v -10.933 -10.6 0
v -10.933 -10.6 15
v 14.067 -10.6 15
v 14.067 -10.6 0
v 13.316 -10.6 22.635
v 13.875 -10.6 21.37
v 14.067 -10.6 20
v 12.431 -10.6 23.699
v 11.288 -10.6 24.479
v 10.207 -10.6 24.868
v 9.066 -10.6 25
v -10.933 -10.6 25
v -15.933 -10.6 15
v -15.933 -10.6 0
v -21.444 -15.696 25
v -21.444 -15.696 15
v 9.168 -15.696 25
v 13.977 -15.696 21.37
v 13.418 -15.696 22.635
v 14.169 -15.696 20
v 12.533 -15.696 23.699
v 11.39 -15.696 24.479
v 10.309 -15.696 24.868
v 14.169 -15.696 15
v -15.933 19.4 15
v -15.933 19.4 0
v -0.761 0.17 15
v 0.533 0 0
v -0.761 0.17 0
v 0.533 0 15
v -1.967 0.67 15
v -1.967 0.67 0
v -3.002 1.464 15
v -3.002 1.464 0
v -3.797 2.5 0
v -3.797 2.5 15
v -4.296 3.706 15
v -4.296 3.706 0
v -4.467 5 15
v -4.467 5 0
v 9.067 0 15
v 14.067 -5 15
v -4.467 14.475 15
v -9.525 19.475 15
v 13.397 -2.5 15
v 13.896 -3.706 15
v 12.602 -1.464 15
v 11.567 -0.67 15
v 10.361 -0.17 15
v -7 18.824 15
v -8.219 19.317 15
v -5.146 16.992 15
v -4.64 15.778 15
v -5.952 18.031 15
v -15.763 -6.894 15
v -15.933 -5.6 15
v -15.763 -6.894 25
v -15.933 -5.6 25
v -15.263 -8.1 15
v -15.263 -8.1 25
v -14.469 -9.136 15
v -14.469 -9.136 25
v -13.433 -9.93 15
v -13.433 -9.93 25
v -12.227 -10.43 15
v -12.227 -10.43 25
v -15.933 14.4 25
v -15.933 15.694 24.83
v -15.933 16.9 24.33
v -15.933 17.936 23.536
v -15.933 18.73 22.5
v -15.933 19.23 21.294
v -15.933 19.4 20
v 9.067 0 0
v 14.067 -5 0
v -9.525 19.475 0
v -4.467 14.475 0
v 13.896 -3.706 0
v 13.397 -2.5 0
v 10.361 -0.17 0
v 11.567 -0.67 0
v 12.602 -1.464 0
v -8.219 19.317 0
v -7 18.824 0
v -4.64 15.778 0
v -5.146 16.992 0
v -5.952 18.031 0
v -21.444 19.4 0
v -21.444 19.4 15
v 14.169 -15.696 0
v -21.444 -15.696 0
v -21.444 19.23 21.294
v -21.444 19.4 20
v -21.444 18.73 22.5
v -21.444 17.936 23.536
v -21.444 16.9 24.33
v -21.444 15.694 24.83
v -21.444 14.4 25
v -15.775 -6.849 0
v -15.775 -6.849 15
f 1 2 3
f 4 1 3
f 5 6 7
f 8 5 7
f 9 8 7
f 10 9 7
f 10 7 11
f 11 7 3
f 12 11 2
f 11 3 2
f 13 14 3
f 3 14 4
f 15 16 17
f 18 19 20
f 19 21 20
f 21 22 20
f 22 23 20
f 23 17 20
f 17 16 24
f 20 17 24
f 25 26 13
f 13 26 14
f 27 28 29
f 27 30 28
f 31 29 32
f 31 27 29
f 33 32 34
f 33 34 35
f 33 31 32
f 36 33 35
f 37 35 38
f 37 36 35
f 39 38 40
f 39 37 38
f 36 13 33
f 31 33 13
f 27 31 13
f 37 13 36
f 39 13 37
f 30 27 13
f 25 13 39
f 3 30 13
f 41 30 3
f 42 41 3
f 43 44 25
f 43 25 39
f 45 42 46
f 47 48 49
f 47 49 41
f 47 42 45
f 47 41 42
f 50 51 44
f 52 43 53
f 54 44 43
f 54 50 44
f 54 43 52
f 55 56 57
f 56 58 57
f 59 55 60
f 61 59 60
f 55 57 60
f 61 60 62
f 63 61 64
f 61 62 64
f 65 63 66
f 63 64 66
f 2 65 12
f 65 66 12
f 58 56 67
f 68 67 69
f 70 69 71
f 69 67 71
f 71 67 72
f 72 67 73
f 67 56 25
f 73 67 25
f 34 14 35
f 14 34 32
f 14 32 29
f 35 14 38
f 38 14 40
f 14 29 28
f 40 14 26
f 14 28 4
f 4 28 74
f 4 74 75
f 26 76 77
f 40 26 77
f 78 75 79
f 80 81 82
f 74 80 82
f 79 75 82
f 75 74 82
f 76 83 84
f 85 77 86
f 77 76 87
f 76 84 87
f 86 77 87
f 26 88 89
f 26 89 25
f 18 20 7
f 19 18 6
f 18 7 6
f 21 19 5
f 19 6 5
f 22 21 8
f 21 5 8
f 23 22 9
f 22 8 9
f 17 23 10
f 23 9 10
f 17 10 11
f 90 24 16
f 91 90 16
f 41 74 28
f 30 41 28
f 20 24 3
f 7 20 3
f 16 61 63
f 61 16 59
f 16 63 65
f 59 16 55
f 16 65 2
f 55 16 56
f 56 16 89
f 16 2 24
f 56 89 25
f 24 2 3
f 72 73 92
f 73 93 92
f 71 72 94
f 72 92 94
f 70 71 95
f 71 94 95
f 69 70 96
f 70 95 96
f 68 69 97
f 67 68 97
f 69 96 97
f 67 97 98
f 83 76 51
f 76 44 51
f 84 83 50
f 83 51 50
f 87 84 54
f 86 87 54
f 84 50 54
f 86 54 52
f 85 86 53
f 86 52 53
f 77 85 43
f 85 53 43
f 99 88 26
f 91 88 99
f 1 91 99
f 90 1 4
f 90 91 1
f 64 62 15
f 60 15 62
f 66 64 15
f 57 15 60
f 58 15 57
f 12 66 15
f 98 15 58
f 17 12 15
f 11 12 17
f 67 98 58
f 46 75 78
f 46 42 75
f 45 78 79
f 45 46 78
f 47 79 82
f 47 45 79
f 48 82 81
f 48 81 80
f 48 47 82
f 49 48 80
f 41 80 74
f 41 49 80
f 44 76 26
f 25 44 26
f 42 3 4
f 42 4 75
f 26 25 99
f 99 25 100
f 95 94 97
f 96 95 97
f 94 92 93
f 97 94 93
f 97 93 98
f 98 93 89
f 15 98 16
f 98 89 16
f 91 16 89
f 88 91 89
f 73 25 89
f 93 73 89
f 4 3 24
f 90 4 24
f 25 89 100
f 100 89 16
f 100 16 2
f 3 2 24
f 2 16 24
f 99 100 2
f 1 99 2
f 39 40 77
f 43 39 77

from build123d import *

# Parameters (mm, degrees)
F1_DEPTH = 15
F3_DEPTH = 10
F4_R     = 5
F4_2_R   = 5
F6_DEPTH = 15


with BuildPart() as f1:
    # F0 (on Top) → F1 (new body)
    with BuildSketch(Plane.XY):
        Polygon((-4.466667, 19.533333), (-15.933334, 19.4), (-15.933334, -10.6), (14.066666, -10.6), (14.066666, 0), (-4.466667, 0), align=None)
    extrude(amount=F1_DEPTH)

    # F4#2
    f4_2_edges = [f1.edges().sort_by_distance(p)[0] for p in [
        (-4.466667, 19.533333, 7.5),
        (14.066666, 0, 7.5),
        (-4.466667, 0, 7.5),
    ]]
    fillet(f4_2_edges, radius=F4_2_R)


with BuildPart() as f3:
    # F2 (on face) → F3 (new body)
    with BuildSketch(Plane.XY.offset(15)):
        Polygon((-15.933334, -10.6), (-15.933334, 19.4), (-21.443581, 19.4), (-21.443581, -15.695864), (14.168908, -15.695864), (14.066666, -10.6), align=None)
    extrude(amount=F3_DEPTH)

    # F4
    f4_edges = [f3.edges().sort_by_distance(p)[0] for p in [
        (14.117787, -13.147932, 25),
        (-18.688458, 19.4, 25),
        (-15.933334, -10.6, 20),
    ]]
    fillet(f4_edges, radius=F4_R)


with BuildPart() as f6:
    # F5 (on face) → F6 (new body)
    with BuildSketch(Plane(origin=(0, 0, 15), x_dir=(1, 0, 0), z_dir=(0, 0, -1))):
        Polygon((14.168908, 15.695864), (-21.443581, 15.695864), (-21.443581, -19.4), (-15.933334, -19.4), (-15.774743, 6.849304), (-10.933334, 10.6), (14.066666, 10.6), align=None)
    extrude(amount=F6_DEPTH)


solid = Compound([f1.part, f3.part, f6.part])
